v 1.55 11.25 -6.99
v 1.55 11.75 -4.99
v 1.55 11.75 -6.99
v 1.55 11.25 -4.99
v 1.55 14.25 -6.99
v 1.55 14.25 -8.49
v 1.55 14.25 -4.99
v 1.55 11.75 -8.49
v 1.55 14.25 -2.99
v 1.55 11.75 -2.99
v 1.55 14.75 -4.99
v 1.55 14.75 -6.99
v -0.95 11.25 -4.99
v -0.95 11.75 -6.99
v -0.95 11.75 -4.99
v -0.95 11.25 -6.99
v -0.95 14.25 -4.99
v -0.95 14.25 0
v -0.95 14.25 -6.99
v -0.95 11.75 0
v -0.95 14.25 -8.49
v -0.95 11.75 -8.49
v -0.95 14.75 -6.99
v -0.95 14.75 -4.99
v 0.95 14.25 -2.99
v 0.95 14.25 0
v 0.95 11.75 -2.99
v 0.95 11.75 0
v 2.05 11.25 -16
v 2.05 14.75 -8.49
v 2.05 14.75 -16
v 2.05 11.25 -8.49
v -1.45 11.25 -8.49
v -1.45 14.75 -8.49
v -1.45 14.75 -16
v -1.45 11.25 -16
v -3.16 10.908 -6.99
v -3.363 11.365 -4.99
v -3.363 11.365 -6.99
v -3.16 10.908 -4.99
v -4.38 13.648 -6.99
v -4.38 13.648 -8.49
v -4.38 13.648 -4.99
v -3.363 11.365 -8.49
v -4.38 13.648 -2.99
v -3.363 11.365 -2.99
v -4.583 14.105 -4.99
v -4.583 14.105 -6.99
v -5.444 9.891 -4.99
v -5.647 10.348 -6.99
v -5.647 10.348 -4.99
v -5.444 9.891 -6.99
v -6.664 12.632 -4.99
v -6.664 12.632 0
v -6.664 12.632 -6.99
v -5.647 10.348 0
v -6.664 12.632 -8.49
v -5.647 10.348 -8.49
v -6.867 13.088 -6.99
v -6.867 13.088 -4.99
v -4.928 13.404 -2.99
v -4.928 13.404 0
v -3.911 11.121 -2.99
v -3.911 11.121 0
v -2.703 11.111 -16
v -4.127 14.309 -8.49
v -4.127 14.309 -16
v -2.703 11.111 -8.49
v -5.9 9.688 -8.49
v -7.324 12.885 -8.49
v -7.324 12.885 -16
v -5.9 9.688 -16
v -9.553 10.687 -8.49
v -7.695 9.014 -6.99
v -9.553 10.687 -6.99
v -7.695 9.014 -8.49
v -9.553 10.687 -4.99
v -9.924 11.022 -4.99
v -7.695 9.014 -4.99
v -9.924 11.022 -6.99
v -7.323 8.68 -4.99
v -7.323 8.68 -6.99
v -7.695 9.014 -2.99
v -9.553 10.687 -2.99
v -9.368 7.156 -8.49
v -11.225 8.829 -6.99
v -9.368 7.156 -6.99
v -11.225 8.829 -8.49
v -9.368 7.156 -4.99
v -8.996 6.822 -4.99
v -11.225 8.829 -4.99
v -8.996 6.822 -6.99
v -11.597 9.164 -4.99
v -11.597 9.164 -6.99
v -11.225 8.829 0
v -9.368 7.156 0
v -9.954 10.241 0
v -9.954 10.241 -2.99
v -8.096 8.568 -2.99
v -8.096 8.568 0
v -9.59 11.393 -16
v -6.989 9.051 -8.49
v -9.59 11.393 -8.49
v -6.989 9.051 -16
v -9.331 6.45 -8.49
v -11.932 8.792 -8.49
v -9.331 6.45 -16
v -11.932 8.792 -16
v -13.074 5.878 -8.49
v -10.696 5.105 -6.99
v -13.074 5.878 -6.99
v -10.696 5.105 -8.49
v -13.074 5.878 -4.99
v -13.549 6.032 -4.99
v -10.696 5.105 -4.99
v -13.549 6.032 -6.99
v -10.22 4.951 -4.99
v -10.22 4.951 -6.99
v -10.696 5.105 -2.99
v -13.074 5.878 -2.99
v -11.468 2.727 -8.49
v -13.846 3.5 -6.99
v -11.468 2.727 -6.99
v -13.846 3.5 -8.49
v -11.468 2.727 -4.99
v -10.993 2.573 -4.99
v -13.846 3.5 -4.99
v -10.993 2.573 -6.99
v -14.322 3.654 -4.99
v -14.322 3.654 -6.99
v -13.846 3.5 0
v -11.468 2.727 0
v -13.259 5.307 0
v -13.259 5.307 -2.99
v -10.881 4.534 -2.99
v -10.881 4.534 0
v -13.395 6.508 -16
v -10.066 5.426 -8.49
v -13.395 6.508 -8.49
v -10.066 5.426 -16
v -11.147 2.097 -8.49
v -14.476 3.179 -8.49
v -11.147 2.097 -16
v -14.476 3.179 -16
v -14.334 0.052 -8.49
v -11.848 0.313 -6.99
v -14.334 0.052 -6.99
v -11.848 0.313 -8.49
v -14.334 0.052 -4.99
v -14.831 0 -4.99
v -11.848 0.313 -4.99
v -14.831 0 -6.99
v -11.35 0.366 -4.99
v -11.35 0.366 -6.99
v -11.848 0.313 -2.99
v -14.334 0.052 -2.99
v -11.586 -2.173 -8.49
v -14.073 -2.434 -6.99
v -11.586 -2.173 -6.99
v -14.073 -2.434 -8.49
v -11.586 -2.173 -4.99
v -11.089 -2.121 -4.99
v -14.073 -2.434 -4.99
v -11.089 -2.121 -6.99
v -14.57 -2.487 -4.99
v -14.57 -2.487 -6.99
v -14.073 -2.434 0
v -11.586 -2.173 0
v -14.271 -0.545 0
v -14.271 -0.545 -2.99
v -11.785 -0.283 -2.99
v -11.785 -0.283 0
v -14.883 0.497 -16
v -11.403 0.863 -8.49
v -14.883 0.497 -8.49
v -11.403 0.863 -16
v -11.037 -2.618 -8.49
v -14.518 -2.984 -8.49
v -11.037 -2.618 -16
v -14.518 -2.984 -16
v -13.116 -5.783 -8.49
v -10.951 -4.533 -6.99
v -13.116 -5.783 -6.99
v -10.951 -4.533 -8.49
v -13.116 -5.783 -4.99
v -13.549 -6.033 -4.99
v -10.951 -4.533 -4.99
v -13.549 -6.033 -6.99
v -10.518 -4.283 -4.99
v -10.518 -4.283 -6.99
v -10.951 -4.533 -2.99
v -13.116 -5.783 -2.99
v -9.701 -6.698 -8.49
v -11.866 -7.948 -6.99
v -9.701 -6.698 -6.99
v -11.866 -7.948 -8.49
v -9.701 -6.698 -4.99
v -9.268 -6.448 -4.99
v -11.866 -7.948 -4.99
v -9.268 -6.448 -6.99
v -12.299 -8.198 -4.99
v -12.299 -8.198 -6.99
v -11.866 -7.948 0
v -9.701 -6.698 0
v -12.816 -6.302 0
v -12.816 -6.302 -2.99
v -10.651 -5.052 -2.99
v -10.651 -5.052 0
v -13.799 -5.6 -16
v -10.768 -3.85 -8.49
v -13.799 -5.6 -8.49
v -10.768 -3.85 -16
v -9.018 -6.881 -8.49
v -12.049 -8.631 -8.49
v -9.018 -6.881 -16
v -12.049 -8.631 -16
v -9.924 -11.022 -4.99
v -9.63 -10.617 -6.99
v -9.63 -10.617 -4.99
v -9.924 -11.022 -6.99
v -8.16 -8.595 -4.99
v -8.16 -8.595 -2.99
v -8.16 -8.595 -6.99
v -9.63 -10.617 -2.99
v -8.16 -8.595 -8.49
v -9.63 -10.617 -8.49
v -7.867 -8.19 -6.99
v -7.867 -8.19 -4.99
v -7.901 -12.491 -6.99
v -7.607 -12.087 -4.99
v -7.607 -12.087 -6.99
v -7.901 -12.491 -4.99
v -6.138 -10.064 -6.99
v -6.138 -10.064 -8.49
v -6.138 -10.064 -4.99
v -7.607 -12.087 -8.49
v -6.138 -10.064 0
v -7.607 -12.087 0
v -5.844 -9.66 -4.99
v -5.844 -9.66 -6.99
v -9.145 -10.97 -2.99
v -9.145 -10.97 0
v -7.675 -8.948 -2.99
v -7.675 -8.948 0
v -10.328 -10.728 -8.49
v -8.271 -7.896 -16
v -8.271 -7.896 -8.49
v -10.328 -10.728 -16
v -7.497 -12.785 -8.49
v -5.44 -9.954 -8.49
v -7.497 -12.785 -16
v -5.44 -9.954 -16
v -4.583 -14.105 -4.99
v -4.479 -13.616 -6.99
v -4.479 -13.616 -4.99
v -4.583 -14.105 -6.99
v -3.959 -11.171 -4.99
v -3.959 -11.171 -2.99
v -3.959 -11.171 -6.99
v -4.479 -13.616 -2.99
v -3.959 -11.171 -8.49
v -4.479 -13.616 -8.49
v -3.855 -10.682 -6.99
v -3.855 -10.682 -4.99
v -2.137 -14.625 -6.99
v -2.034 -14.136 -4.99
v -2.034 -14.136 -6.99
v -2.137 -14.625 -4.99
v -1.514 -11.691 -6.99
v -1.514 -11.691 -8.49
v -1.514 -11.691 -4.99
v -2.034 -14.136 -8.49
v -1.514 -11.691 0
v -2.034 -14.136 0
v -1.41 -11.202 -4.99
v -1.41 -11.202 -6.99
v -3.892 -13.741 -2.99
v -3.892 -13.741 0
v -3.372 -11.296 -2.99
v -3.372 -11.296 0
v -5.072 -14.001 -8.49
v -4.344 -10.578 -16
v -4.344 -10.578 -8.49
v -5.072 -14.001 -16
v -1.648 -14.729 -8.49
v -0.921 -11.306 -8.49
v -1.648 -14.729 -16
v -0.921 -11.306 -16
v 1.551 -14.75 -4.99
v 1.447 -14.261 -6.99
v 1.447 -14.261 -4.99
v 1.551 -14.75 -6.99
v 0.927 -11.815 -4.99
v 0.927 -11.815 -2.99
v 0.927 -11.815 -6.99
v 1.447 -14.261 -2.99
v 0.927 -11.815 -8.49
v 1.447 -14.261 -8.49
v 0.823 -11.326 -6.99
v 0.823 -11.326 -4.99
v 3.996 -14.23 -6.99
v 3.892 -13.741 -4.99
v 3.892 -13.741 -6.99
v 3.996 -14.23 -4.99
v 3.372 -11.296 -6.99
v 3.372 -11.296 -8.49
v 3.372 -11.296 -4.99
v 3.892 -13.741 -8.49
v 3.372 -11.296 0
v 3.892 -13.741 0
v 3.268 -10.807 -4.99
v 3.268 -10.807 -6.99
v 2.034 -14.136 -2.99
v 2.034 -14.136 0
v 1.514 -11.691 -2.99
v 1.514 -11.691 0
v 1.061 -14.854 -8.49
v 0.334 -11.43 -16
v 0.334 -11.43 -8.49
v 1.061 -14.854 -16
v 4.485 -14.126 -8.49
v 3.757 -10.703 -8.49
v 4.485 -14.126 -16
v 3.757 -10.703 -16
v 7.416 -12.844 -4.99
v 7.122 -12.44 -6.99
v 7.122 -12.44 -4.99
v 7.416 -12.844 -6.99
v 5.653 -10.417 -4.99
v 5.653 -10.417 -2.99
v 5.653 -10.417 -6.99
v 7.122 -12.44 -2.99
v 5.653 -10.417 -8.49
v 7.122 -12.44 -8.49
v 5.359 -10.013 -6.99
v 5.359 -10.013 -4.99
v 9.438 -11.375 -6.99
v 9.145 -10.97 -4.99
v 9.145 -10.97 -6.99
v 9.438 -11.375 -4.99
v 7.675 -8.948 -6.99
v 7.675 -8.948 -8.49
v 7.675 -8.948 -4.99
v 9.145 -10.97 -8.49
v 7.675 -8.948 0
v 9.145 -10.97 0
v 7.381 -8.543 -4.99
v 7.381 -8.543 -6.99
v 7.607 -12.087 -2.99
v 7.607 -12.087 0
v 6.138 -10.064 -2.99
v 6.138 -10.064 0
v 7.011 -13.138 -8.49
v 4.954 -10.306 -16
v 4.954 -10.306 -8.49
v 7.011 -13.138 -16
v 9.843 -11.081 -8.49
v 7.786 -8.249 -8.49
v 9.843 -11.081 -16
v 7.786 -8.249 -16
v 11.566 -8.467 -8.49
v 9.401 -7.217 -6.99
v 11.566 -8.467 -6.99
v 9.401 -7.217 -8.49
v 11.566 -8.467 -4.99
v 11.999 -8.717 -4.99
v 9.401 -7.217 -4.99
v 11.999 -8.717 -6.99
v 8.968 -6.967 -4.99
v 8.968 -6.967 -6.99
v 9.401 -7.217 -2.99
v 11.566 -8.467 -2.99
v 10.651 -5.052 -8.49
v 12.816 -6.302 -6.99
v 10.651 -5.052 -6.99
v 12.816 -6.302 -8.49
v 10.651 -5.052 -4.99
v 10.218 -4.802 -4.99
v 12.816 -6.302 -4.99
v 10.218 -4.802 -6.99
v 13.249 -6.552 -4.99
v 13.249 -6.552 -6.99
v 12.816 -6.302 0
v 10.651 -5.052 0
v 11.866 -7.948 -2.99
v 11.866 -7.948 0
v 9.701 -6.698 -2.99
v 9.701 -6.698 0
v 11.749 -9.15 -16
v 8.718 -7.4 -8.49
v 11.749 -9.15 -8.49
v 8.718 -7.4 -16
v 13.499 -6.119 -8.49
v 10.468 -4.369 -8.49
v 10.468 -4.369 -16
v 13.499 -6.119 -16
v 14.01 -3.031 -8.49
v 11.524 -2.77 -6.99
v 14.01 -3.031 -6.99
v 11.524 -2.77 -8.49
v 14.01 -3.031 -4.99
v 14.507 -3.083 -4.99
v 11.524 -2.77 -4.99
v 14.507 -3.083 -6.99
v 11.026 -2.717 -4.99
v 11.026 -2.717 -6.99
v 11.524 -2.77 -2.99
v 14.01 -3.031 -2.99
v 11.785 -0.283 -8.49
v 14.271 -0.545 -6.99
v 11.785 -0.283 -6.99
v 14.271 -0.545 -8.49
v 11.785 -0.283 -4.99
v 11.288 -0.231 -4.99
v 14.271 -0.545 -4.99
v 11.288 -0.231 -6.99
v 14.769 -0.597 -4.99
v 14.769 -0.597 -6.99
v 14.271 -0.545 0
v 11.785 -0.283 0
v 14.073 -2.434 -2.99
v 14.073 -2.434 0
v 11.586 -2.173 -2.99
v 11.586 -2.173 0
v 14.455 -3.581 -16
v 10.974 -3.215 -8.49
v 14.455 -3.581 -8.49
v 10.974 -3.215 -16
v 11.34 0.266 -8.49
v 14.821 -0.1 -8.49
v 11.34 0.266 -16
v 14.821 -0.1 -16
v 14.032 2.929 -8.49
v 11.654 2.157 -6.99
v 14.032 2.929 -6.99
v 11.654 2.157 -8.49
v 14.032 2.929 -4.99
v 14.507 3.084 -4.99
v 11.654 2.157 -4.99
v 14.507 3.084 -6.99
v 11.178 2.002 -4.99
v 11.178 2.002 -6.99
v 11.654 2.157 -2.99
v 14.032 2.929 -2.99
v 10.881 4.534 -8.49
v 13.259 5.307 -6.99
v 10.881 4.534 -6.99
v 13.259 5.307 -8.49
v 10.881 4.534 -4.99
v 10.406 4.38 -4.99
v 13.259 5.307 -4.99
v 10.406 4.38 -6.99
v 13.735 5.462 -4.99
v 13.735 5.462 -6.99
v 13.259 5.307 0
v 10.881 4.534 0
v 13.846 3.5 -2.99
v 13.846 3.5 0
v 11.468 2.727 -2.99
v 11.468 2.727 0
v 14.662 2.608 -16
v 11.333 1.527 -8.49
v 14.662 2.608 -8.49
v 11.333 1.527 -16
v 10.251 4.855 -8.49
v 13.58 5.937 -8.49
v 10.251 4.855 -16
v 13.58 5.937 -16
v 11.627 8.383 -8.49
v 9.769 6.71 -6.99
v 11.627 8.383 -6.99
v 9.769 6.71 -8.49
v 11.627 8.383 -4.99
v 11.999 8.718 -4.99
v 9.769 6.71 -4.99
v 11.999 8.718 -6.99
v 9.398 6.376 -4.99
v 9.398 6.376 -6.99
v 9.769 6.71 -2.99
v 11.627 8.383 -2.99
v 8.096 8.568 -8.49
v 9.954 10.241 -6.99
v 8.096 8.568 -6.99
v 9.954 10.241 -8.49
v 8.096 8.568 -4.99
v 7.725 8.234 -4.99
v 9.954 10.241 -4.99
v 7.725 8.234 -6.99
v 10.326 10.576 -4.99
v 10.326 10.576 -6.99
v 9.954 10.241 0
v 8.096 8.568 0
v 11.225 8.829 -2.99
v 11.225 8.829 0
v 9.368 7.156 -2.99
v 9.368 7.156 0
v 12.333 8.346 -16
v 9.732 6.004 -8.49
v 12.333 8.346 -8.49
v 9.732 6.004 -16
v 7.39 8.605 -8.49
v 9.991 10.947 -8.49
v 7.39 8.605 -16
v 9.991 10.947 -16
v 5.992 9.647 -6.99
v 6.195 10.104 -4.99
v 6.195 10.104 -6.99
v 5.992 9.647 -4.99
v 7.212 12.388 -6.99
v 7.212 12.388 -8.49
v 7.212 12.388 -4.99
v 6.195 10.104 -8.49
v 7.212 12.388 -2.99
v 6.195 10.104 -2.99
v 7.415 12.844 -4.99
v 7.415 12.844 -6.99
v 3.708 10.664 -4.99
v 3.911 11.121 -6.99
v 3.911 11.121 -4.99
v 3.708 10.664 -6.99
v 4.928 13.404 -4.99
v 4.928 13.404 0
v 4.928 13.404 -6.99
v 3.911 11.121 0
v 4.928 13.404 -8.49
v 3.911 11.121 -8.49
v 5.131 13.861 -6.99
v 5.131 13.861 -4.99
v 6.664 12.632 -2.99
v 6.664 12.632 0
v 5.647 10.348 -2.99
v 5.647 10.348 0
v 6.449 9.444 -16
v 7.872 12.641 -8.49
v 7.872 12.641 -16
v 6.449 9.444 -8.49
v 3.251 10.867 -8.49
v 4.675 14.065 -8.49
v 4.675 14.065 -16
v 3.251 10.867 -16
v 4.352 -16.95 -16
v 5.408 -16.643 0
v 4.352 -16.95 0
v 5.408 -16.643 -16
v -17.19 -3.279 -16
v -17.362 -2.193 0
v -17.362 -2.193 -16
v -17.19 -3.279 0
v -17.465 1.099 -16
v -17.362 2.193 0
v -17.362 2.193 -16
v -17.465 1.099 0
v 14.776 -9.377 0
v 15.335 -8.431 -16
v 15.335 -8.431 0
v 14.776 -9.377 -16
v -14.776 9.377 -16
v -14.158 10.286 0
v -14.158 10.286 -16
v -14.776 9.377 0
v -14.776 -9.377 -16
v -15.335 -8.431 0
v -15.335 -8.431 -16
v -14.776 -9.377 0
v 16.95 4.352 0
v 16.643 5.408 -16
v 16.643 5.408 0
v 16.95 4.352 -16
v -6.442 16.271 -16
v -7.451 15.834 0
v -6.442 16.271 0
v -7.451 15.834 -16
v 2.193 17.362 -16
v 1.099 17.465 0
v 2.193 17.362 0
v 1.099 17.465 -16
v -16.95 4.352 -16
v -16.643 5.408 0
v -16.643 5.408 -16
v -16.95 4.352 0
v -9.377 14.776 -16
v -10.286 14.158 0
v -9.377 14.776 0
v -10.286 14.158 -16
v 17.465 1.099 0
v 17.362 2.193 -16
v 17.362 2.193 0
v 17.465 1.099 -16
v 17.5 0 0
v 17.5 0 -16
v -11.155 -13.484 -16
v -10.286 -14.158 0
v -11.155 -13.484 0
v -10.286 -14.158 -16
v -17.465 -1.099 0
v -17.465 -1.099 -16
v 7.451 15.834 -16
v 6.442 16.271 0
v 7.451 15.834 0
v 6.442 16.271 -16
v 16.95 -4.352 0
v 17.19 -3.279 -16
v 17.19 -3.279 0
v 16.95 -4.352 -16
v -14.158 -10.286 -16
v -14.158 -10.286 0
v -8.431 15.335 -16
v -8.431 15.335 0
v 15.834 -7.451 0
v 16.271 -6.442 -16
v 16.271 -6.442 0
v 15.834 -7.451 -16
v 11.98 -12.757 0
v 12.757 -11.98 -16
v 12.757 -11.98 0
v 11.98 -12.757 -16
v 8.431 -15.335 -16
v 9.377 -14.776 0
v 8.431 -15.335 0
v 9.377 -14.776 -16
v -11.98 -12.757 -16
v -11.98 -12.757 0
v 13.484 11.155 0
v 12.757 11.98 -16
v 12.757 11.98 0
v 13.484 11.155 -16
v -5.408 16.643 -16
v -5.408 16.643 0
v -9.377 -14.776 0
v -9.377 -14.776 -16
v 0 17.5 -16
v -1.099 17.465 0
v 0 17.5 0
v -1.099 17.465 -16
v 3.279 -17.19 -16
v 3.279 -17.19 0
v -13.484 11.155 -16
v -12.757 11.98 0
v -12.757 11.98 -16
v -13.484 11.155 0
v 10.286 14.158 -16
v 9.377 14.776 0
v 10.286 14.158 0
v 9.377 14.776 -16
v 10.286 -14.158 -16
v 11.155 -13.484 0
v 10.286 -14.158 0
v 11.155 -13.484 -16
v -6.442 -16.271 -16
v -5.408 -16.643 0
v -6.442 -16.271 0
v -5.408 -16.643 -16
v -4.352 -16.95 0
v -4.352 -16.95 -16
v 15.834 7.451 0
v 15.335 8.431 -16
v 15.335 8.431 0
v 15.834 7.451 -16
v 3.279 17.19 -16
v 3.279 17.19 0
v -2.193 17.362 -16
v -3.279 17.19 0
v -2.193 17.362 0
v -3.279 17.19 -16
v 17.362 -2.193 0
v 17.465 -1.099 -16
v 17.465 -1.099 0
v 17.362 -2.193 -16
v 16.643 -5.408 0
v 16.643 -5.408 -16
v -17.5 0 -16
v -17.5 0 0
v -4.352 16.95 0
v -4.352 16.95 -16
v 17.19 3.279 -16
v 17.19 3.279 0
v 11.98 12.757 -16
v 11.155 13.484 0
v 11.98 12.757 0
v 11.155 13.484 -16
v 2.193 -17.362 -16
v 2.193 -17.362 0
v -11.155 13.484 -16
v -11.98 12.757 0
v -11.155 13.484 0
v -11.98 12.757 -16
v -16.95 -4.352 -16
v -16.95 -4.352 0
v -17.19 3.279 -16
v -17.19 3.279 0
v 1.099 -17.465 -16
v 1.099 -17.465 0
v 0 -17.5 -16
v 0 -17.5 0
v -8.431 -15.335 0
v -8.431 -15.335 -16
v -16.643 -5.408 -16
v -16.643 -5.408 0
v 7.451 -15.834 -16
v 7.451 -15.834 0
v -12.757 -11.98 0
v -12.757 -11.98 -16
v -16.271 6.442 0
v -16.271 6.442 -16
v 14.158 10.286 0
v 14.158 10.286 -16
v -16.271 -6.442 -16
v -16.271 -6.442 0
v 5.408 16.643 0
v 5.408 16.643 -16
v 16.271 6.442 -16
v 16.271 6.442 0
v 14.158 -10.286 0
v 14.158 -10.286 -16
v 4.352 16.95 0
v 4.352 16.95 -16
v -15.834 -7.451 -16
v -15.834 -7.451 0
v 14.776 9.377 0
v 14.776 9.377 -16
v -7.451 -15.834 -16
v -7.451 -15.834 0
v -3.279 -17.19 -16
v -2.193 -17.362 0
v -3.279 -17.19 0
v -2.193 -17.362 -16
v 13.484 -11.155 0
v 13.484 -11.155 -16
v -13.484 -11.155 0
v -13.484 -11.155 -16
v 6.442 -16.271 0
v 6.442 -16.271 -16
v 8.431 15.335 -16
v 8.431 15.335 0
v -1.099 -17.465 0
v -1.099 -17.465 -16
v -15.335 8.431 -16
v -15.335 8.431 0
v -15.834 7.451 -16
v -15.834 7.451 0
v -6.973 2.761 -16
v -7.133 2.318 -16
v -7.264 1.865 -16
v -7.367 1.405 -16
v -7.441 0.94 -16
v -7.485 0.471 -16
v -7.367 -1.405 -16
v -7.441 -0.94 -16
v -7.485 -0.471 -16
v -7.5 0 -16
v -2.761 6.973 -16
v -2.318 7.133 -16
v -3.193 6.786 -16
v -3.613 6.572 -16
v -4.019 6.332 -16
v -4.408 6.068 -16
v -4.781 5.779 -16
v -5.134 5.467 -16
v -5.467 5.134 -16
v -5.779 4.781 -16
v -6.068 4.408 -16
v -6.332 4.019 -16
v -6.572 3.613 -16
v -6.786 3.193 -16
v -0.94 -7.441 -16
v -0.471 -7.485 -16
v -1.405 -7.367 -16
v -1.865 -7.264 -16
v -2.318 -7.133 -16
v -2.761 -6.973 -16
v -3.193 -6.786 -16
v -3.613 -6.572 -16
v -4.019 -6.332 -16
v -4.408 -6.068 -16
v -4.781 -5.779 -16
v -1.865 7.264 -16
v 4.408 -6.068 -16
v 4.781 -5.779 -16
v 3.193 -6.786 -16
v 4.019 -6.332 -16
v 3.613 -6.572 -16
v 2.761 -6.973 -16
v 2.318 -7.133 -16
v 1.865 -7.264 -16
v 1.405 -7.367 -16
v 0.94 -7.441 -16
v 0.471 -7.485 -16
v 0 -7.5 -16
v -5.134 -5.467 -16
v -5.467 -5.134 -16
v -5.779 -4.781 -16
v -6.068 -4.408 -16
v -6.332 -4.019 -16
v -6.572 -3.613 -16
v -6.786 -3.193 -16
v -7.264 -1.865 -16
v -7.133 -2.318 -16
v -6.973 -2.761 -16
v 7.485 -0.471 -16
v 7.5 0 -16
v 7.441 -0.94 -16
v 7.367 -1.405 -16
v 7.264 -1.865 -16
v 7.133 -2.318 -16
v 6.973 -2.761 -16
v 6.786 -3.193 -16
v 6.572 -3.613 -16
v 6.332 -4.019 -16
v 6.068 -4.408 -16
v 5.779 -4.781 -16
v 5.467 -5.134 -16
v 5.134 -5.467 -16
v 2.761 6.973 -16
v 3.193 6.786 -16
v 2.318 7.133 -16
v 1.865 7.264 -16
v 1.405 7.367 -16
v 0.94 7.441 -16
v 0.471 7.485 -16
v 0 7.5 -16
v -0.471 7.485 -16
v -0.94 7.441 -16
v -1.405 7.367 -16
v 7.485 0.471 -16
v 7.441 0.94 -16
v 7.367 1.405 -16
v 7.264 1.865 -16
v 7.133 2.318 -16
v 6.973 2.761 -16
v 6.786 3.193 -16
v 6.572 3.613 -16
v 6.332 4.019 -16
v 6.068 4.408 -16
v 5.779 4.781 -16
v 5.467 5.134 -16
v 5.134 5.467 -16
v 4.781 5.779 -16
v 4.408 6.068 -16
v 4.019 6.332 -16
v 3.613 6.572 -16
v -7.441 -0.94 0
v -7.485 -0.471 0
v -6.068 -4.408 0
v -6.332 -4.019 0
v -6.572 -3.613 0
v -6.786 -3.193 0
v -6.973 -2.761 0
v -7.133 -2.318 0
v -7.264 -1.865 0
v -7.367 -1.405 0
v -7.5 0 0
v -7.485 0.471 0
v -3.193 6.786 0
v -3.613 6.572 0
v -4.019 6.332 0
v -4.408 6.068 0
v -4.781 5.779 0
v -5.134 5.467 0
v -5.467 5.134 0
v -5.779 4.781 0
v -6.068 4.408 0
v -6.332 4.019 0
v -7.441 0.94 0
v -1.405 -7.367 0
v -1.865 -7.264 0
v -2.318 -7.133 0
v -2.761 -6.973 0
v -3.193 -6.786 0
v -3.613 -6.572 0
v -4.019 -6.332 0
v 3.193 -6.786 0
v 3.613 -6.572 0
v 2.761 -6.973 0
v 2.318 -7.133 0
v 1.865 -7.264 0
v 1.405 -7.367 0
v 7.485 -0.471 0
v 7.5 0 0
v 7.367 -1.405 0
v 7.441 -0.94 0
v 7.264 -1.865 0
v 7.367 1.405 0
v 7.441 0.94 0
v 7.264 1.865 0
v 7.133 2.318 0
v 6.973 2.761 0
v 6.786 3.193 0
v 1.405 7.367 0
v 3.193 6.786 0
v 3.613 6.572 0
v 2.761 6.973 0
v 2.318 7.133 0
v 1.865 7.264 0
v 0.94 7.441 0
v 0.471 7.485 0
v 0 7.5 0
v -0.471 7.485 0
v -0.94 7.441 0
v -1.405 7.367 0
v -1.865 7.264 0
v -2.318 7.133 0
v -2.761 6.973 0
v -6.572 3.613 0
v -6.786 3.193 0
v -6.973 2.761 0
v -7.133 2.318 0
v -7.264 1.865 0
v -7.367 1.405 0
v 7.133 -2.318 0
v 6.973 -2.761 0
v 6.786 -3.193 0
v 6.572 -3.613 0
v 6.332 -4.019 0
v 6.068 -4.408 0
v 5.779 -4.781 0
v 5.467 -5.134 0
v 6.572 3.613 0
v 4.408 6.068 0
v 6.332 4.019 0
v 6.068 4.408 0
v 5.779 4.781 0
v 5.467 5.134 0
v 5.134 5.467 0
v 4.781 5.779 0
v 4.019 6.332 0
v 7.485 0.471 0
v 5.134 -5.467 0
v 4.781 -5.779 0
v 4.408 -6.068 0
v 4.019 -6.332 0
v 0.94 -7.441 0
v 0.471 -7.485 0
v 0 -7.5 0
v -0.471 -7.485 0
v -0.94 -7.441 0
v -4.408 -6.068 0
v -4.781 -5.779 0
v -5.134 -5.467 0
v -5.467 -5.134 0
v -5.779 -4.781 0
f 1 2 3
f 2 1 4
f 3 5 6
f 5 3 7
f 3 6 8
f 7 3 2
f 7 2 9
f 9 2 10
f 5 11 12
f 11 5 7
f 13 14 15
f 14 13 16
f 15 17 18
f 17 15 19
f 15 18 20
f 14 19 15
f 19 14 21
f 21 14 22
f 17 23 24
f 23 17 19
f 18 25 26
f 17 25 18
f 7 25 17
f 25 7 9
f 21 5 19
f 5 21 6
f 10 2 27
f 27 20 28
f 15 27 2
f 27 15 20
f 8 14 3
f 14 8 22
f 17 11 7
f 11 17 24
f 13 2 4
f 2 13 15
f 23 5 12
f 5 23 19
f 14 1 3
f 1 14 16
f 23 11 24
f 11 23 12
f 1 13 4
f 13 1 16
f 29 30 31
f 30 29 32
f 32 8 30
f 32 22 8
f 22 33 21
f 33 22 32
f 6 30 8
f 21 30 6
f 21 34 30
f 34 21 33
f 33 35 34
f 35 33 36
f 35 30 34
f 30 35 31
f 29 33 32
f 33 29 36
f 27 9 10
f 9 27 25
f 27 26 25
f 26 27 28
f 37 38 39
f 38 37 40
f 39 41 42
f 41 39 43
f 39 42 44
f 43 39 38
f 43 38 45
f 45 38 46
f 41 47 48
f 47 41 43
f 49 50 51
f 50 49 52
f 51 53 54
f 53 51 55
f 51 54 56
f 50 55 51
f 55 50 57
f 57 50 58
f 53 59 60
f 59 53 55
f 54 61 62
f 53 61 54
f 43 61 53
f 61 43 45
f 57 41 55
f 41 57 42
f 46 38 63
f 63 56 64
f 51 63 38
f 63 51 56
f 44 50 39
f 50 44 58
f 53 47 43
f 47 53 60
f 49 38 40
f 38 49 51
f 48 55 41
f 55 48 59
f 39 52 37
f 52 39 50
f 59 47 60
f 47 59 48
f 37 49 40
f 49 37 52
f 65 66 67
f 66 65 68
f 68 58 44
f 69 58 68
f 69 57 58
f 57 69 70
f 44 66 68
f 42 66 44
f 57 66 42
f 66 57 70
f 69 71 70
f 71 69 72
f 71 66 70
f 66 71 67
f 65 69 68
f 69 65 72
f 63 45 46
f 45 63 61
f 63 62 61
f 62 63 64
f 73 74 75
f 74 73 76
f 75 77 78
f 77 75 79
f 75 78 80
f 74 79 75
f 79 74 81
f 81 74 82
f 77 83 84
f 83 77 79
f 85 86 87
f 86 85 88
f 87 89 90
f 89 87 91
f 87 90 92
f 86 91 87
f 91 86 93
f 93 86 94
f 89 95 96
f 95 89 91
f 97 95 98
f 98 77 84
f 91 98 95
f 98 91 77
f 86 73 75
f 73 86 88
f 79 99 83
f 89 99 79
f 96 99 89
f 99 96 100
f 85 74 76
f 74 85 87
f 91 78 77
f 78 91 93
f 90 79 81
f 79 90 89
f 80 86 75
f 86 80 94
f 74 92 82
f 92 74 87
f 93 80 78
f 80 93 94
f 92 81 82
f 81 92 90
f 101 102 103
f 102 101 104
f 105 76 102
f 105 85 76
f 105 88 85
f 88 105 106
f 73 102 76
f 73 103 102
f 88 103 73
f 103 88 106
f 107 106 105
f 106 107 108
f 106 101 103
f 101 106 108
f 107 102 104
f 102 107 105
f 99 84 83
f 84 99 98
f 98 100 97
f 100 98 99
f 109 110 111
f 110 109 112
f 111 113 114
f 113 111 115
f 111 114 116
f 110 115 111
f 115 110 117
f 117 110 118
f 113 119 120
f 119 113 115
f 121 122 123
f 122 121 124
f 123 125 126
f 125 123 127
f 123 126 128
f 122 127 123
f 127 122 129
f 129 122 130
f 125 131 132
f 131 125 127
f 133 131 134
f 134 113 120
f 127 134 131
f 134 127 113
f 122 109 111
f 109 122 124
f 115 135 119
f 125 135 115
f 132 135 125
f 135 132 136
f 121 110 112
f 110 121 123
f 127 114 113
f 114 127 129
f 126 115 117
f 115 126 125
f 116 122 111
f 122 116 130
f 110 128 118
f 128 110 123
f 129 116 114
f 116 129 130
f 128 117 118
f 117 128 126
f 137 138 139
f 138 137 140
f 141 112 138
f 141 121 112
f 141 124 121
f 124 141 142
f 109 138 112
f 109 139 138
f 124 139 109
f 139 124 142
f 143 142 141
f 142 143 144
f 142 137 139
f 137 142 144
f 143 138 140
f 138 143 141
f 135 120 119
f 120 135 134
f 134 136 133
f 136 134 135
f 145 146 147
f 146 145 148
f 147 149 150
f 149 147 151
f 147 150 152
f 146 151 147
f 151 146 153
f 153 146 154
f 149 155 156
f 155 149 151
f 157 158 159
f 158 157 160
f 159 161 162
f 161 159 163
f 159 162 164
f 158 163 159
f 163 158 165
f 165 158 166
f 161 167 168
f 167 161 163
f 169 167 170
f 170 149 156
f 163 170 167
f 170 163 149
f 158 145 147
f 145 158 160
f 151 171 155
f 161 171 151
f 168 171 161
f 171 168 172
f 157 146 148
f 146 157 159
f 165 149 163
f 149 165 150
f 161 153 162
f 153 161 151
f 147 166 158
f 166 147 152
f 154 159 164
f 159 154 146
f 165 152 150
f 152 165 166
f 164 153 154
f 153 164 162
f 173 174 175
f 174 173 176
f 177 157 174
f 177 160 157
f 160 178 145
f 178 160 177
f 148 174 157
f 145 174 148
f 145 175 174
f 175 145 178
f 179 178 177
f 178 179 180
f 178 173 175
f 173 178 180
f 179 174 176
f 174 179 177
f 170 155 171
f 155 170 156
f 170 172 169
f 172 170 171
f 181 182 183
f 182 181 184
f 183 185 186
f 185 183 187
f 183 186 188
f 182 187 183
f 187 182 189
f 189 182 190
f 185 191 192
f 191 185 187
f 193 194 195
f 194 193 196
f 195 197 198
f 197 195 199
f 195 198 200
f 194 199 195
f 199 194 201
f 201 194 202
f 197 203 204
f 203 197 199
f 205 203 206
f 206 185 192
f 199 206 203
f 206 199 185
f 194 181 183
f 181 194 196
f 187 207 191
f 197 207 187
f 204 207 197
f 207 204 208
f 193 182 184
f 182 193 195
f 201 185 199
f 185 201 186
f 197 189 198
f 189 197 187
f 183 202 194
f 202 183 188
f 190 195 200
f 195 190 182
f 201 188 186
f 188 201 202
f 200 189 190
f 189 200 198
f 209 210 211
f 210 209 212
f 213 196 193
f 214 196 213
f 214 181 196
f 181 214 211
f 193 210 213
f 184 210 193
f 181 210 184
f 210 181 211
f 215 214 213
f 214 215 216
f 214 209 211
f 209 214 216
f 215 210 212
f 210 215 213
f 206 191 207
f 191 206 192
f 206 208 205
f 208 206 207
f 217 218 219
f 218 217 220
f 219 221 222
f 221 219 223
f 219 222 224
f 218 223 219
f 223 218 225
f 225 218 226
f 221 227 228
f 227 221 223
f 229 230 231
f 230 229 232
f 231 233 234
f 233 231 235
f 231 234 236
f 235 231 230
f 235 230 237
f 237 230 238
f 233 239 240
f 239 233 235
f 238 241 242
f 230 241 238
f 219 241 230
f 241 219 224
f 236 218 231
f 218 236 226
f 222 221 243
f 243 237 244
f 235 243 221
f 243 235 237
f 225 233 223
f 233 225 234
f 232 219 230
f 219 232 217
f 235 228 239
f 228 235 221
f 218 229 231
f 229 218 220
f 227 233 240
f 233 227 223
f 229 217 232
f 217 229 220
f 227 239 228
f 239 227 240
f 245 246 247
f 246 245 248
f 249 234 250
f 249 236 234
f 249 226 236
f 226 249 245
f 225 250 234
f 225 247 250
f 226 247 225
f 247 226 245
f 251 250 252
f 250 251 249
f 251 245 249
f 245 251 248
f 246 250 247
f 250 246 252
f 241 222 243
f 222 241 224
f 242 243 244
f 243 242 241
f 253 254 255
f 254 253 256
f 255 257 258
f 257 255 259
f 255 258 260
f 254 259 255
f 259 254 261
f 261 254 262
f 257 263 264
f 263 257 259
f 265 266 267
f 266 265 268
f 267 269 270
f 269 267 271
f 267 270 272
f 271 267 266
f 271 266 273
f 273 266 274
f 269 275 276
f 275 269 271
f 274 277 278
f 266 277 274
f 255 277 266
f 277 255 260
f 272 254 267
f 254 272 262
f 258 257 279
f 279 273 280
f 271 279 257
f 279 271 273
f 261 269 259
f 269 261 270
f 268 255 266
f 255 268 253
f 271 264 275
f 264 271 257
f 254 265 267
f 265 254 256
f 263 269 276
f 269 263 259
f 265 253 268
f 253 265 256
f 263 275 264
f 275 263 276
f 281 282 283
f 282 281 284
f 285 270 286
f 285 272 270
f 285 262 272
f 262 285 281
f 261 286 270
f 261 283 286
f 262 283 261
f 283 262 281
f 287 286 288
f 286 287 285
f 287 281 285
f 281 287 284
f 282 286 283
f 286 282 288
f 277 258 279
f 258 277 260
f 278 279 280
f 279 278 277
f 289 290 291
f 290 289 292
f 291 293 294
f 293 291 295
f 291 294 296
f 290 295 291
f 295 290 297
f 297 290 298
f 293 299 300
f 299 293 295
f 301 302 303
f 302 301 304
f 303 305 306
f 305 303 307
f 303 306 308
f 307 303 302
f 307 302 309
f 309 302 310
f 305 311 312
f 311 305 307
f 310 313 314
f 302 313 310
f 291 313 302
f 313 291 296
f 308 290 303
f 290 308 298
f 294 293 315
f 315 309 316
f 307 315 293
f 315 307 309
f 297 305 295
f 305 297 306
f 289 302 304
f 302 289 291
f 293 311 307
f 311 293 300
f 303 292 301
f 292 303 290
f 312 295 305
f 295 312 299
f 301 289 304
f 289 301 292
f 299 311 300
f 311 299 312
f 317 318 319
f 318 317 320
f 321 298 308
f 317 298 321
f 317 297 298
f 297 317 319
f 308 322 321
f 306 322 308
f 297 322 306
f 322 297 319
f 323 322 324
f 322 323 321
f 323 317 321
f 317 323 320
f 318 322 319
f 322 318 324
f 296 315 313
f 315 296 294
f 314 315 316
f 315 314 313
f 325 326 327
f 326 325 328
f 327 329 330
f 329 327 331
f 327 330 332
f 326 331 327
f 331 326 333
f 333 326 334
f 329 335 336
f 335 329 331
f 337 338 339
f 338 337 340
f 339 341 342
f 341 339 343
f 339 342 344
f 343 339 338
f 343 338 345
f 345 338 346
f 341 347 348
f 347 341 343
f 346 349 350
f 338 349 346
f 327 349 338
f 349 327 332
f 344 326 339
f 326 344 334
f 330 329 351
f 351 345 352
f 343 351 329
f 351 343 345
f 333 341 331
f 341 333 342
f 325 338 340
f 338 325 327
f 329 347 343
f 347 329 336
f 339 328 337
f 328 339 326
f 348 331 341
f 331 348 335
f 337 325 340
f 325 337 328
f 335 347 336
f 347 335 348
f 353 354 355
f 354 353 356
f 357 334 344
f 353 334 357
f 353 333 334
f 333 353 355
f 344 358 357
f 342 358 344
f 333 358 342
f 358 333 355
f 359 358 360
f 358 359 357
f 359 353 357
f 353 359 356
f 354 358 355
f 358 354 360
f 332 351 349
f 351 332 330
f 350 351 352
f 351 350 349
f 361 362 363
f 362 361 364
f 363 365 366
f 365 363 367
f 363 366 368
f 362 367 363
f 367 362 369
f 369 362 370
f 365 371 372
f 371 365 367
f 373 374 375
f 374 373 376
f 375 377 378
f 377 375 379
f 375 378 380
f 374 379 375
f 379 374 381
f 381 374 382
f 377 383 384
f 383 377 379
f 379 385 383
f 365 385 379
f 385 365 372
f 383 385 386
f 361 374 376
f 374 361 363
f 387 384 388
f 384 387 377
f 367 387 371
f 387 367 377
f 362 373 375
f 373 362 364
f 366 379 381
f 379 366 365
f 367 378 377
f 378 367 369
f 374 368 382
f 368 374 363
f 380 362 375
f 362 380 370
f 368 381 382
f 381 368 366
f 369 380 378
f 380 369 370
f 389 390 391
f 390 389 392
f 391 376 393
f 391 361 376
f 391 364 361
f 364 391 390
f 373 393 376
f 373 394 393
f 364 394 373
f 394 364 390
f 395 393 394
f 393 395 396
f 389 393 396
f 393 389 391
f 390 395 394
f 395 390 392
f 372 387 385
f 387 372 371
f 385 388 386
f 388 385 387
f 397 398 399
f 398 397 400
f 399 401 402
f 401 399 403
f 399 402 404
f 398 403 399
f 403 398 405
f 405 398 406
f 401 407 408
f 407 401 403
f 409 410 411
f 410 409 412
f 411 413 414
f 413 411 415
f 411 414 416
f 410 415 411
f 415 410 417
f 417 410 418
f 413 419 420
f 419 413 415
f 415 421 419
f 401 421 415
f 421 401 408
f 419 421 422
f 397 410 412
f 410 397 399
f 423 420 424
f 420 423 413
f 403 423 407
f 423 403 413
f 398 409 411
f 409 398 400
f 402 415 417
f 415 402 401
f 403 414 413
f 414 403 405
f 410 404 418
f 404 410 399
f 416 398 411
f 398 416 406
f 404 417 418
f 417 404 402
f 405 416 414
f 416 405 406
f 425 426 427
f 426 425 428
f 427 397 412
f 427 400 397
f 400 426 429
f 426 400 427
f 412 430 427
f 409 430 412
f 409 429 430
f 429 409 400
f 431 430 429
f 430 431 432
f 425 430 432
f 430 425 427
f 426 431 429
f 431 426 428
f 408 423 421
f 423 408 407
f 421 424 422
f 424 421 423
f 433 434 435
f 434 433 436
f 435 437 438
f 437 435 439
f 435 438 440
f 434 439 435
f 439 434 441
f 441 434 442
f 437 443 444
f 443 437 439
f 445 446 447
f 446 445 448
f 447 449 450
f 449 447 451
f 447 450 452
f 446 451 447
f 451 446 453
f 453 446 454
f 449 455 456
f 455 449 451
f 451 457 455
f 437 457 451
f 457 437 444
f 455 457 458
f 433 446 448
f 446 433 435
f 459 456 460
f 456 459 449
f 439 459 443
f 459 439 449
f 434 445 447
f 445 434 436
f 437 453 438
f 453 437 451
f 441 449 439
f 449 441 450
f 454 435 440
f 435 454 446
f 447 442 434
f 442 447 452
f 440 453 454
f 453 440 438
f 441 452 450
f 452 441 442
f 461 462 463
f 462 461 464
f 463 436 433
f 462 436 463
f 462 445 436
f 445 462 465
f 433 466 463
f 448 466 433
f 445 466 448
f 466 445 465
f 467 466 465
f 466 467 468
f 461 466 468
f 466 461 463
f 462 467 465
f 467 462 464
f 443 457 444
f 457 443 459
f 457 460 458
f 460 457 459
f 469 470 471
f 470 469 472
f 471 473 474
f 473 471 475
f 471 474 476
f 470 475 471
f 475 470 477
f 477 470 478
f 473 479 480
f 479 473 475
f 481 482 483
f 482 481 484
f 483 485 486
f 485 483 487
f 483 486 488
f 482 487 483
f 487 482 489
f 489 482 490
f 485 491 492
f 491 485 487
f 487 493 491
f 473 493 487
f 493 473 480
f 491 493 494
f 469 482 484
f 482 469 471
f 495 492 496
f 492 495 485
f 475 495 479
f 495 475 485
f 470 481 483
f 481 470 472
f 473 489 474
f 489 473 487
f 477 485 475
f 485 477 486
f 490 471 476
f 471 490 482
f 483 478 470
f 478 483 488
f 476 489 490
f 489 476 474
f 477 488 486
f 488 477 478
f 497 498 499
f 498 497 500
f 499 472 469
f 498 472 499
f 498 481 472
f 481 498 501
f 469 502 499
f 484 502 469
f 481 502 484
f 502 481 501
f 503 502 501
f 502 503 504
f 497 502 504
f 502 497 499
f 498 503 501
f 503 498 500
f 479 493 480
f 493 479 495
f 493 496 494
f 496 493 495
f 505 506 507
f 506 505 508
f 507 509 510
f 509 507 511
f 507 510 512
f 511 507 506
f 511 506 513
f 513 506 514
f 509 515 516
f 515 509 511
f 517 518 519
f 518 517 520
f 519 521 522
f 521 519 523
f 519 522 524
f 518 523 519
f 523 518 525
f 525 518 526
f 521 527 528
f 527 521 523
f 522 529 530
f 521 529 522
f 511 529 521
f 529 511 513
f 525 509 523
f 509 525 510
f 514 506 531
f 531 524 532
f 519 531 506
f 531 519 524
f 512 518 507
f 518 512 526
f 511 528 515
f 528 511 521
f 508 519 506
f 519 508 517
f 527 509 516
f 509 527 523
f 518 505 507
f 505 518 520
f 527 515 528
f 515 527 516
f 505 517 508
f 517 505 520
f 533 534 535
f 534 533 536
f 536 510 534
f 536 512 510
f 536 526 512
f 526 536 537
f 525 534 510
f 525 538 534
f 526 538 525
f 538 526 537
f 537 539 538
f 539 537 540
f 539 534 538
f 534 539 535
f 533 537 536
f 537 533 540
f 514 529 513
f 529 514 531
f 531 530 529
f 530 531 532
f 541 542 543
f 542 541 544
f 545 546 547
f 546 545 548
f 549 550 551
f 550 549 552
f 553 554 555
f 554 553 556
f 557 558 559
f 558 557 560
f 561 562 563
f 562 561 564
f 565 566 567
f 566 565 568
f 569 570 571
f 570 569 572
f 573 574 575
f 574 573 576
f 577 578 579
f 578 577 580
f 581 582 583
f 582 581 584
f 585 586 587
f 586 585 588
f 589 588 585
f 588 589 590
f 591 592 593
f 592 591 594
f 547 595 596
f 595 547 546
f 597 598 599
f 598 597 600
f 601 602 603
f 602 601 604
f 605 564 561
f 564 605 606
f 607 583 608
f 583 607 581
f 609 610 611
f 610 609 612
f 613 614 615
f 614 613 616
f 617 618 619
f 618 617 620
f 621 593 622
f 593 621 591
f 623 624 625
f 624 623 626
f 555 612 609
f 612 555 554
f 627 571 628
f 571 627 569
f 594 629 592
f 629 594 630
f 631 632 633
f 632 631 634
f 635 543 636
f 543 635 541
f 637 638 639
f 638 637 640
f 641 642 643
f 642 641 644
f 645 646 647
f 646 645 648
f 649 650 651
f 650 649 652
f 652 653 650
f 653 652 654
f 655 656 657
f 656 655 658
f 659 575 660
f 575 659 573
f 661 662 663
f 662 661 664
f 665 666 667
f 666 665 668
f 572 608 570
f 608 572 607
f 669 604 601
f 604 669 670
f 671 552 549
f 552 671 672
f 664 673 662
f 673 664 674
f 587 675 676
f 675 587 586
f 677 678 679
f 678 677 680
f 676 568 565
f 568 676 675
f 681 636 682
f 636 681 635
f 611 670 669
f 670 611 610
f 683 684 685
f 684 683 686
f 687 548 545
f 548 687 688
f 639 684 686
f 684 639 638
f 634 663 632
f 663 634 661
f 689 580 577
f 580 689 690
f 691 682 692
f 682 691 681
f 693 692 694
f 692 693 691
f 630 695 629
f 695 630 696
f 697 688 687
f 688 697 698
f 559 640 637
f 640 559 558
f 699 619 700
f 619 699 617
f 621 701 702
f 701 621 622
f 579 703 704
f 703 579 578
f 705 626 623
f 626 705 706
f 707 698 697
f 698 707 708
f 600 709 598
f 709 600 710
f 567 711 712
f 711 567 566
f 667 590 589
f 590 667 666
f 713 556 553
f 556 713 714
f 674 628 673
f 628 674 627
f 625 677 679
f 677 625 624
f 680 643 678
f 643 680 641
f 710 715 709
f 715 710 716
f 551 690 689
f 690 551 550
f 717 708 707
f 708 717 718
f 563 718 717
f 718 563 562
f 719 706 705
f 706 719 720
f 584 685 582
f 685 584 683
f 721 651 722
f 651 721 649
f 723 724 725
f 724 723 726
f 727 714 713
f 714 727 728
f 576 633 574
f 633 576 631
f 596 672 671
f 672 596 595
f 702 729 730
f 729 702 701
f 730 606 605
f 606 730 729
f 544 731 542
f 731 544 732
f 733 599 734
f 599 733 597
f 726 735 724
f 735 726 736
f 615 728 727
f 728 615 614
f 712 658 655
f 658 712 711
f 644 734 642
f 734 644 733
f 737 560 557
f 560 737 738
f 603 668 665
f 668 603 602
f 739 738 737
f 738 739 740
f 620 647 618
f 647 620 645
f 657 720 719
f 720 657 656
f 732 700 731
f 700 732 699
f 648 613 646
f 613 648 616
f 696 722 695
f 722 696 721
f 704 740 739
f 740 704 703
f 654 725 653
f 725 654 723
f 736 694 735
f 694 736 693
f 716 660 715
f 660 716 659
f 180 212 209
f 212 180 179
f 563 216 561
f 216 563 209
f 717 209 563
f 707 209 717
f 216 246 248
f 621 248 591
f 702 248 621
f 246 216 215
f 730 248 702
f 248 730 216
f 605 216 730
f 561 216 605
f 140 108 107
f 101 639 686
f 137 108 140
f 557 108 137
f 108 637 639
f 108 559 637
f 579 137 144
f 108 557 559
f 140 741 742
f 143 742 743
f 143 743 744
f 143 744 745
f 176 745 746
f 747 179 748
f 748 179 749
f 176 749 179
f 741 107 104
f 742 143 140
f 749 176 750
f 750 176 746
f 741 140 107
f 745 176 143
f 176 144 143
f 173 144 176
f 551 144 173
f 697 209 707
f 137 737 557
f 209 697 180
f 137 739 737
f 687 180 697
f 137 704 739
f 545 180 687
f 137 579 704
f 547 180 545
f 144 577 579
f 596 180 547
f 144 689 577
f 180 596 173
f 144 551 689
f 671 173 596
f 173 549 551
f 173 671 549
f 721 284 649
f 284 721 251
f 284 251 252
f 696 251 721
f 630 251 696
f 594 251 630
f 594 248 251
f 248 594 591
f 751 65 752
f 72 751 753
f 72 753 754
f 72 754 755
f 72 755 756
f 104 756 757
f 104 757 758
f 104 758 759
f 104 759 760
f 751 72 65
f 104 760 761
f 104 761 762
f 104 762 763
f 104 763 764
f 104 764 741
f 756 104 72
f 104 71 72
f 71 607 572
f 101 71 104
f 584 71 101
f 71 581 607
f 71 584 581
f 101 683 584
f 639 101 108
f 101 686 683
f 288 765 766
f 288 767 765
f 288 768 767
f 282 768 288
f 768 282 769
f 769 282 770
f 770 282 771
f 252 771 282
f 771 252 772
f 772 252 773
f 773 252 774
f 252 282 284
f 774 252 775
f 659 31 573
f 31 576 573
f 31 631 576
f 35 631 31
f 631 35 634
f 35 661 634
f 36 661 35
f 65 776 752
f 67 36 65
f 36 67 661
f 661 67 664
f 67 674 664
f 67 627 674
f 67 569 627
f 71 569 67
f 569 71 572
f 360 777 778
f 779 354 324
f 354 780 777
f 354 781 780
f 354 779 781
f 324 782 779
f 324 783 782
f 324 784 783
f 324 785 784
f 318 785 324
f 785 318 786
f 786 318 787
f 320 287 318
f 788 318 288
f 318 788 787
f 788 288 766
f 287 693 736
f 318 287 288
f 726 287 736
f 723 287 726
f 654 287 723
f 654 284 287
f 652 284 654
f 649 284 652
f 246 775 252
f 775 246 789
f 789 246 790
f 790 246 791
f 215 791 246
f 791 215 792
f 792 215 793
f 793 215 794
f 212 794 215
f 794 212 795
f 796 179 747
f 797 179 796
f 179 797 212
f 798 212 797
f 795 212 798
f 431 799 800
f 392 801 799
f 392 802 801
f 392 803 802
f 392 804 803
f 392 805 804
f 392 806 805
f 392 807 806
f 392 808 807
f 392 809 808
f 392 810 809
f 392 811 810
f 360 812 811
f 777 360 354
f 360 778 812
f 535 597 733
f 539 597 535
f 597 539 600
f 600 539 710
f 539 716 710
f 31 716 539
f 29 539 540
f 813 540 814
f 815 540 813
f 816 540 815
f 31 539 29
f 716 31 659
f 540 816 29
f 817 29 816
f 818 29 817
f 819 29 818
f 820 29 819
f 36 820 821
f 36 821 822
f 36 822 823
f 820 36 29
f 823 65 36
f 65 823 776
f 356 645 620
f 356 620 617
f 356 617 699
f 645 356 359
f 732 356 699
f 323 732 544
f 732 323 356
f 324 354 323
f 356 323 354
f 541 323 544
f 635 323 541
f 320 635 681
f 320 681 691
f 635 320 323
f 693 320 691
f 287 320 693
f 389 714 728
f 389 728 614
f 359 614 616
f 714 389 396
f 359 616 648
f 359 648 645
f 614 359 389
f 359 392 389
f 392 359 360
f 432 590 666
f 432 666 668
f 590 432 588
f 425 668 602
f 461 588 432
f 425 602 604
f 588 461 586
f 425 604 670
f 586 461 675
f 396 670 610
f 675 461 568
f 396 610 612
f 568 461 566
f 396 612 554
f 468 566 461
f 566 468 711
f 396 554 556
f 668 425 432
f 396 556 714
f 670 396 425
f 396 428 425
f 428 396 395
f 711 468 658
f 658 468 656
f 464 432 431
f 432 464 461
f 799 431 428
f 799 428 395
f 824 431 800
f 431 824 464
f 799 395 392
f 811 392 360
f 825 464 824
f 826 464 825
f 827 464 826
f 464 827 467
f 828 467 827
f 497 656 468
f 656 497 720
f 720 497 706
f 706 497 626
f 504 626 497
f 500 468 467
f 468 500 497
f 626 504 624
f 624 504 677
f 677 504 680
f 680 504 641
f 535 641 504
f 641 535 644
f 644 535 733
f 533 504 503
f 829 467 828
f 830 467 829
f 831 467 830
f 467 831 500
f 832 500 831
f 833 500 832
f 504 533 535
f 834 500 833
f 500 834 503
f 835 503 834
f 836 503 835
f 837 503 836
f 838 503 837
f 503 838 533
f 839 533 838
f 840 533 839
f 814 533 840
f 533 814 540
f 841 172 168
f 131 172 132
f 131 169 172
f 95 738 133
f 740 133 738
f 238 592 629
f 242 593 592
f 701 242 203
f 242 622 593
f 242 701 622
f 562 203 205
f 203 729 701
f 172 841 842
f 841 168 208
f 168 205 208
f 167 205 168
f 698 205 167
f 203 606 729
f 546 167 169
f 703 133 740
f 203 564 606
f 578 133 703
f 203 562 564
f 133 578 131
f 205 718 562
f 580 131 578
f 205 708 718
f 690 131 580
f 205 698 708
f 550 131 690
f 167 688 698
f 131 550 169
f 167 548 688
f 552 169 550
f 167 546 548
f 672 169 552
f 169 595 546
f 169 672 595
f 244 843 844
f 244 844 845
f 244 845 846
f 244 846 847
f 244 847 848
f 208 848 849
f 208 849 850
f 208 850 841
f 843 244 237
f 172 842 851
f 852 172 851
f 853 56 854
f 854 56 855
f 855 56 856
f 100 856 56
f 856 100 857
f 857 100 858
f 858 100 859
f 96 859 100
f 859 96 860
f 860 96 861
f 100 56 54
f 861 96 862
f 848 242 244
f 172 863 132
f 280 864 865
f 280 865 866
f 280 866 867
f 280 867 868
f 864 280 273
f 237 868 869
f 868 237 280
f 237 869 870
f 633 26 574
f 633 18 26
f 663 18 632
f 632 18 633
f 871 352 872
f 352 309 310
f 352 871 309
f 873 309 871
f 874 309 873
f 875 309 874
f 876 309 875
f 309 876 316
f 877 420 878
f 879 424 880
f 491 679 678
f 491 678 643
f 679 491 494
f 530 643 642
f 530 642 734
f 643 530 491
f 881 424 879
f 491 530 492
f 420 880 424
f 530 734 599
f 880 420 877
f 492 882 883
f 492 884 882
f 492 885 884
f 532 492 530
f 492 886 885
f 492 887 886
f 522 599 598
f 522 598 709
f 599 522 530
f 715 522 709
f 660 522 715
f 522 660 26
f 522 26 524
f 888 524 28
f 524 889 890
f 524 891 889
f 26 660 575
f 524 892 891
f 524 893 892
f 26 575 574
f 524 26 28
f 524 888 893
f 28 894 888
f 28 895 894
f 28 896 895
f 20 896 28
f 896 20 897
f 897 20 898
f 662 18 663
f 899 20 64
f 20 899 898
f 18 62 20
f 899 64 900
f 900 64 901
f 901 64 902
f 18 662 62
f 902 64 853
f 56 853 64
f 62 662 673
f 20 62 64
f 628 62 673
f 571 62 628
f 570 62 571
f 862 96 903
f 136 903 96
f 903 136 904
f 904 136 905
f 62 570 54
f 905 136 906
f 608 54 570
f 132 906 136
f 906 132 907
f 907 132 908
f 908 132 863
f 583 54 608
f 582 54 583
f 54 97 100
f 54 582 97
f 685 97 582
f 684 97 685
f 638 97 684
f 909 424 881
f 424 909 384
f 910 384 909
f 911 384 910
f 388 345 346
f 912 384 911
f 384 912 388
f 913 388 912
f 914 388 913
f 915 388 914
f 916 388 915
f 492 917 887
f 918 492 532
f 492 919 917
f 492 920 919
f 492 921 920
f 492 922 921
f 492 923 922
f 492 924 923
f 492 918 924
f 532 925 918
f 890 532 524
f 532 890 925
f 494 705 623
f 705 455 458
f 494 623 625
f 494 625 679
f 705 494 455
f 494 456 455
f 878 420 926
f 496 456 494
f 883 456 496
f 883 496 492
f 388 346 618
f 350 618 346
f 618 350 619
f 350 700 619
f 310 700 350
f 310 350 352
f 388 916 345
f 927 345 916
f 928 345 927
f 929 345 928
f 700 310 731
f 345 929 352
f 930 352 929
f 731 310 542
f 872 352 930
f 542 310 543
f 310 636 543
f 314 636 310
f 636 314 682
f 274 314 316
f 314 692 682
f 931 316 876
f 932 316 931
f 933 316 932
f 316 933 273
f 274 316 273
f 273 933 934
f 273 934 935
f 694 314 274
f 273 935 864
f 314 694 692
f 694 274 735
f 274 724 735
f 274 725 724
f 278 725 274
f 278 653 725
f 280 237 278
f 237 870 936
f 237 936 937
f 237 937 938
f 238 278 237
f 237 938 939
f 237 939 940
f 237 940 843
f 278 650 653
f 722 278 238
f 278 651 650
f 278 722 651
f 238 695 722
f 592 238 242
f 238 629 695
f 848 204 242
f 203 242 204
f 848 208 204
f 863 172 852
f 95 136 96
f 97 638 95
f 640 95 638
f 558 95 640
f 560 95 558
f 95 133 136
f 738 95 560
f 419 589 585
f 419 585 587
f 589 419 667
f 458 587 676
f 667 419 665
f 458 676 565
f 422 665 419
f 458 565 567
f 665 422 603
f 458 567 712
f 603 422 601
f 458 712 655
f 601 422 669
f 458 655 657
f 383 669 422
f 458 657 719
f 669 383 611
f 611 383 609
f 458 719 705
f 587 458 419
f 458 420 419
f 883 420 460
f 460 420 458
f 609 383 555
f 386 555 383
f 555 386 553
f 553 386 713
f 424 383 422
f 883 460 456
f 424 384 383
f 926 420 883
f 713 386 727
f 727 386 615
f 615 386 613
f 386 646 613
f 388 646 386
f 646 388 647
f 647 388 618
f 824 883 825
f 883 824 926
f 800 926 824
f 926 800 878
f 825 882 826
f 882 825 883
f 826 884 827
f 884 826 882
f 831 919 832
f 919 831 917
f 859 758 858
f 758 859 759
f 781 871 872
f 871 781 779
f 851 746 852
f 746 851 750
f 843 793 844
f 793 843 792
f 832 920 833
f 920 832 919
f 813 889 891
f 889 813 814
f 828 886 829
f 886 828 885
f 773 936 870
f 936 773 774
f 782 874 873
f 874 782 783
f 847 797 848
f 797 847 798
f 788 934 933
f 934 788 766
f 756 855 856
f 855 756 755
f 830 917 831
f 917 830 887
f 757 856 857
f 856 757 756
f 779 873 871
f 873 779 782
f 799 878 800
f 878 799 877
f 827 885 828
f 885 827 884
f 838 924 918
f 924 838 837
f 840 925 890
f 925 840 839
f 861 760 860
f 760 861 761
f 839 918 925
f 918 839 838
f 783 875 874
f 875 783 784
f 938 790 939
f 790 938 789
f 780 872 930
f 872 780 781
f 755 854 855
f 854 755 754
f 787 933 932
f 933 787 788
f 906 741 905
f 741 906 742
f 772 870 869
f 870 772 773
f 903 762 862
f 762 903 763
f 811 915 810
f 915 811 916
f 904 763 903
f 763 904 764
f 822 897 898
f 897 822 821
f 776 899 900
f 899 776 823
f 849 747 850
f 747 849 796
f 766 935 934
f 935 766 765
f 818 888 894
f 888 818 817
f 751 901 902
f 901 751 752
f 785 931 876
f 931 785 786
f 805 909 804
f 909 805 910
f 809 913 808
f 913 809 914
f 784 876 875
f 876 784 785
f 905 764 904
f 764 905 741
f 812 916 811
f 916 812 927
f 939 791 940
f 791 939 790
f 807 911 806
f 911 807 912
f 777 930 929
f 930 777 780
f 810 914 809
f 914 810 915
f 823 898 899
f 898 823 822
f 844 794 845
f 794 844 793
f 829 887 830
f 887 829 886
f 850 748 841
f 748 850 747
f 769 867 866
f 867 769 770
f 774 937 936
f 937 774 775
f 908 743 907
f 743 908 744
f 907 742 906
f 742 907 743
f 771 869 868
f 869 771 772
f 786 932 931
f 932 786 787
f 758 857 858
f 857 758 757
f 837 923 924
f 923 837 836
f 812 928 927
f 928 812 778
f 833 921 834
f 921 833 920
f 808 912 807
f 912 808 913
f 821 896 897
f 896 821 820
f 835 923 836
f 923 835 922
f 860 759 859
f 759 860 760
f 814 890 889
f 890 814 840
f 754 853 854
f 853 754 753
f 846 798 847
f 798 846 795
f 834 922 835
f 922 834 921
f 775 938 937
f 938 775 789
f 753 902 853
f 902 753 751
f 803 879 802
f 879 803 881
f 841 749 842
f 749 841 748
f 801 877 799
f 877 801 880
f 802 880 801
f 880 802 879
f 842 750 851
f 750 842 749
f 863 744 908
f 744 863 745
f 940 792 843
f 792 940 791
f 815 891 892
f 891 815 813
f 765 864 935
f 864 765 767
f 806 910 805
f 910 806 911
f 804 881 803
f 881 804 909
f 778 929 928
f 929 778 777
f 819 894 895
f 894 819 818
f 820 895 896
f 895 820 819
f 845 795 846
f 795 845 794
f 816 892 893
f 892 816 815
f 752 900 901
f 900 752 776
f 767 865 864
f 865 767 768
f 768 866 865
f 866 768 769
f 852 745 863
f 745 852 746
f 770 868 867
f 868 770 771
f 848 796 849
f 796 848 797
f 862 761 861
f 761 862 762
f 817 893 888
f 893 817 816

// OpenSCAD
$fn = $preview ? 30 : 100;

d_circle = 26.0;
d_pin = 1.0;
N_PIN = 15;


// Pin position with angular coordinates
module make_pin() {
	alpha = 360 / N_PIN;

	for (i=[0:N_PIN])
		rotate([0, 0, i * alpha])
			translate([0, d_circle / 2, 0])
				children();
}

module singlePinShape() {
	translate([1.25 - 1.9 / 2, 0, 0.01])
		difference() {
			union() {
				translate([0, 0, -15])
					cube([2.5, 2.5, 30], center=true);
				translate([0, 0, +1 - 7])
					cube([2.5, 3.5, 2], center=true);
				translate([0, 0, -15 - 8.5])
					cube([3.5, 3.5, 30], center=true);
			}
			translate([3 - 2.5/2 + 1.9 , 0, 15 - 3])
				cube([6, 6, 30], center=true);
		}
}

// -----------------------
//  Test piece for 1 pin
// -----------------------
// difference() {
// 	translate([0, 0, -16 / 2 - 0.1])
// 		cube(size=[6, 6, 16], center=true);
// 	singlePinShape();
// }

// -----------------------
//  B7S2 socket
// -----------------------
difference() {
	translate([0, 0, -8])
		cylinder(h=16, d=35, center=true);
	make_pin()
		singlePinShape();

	cylinder(h=40, d=15, center=true);
}
